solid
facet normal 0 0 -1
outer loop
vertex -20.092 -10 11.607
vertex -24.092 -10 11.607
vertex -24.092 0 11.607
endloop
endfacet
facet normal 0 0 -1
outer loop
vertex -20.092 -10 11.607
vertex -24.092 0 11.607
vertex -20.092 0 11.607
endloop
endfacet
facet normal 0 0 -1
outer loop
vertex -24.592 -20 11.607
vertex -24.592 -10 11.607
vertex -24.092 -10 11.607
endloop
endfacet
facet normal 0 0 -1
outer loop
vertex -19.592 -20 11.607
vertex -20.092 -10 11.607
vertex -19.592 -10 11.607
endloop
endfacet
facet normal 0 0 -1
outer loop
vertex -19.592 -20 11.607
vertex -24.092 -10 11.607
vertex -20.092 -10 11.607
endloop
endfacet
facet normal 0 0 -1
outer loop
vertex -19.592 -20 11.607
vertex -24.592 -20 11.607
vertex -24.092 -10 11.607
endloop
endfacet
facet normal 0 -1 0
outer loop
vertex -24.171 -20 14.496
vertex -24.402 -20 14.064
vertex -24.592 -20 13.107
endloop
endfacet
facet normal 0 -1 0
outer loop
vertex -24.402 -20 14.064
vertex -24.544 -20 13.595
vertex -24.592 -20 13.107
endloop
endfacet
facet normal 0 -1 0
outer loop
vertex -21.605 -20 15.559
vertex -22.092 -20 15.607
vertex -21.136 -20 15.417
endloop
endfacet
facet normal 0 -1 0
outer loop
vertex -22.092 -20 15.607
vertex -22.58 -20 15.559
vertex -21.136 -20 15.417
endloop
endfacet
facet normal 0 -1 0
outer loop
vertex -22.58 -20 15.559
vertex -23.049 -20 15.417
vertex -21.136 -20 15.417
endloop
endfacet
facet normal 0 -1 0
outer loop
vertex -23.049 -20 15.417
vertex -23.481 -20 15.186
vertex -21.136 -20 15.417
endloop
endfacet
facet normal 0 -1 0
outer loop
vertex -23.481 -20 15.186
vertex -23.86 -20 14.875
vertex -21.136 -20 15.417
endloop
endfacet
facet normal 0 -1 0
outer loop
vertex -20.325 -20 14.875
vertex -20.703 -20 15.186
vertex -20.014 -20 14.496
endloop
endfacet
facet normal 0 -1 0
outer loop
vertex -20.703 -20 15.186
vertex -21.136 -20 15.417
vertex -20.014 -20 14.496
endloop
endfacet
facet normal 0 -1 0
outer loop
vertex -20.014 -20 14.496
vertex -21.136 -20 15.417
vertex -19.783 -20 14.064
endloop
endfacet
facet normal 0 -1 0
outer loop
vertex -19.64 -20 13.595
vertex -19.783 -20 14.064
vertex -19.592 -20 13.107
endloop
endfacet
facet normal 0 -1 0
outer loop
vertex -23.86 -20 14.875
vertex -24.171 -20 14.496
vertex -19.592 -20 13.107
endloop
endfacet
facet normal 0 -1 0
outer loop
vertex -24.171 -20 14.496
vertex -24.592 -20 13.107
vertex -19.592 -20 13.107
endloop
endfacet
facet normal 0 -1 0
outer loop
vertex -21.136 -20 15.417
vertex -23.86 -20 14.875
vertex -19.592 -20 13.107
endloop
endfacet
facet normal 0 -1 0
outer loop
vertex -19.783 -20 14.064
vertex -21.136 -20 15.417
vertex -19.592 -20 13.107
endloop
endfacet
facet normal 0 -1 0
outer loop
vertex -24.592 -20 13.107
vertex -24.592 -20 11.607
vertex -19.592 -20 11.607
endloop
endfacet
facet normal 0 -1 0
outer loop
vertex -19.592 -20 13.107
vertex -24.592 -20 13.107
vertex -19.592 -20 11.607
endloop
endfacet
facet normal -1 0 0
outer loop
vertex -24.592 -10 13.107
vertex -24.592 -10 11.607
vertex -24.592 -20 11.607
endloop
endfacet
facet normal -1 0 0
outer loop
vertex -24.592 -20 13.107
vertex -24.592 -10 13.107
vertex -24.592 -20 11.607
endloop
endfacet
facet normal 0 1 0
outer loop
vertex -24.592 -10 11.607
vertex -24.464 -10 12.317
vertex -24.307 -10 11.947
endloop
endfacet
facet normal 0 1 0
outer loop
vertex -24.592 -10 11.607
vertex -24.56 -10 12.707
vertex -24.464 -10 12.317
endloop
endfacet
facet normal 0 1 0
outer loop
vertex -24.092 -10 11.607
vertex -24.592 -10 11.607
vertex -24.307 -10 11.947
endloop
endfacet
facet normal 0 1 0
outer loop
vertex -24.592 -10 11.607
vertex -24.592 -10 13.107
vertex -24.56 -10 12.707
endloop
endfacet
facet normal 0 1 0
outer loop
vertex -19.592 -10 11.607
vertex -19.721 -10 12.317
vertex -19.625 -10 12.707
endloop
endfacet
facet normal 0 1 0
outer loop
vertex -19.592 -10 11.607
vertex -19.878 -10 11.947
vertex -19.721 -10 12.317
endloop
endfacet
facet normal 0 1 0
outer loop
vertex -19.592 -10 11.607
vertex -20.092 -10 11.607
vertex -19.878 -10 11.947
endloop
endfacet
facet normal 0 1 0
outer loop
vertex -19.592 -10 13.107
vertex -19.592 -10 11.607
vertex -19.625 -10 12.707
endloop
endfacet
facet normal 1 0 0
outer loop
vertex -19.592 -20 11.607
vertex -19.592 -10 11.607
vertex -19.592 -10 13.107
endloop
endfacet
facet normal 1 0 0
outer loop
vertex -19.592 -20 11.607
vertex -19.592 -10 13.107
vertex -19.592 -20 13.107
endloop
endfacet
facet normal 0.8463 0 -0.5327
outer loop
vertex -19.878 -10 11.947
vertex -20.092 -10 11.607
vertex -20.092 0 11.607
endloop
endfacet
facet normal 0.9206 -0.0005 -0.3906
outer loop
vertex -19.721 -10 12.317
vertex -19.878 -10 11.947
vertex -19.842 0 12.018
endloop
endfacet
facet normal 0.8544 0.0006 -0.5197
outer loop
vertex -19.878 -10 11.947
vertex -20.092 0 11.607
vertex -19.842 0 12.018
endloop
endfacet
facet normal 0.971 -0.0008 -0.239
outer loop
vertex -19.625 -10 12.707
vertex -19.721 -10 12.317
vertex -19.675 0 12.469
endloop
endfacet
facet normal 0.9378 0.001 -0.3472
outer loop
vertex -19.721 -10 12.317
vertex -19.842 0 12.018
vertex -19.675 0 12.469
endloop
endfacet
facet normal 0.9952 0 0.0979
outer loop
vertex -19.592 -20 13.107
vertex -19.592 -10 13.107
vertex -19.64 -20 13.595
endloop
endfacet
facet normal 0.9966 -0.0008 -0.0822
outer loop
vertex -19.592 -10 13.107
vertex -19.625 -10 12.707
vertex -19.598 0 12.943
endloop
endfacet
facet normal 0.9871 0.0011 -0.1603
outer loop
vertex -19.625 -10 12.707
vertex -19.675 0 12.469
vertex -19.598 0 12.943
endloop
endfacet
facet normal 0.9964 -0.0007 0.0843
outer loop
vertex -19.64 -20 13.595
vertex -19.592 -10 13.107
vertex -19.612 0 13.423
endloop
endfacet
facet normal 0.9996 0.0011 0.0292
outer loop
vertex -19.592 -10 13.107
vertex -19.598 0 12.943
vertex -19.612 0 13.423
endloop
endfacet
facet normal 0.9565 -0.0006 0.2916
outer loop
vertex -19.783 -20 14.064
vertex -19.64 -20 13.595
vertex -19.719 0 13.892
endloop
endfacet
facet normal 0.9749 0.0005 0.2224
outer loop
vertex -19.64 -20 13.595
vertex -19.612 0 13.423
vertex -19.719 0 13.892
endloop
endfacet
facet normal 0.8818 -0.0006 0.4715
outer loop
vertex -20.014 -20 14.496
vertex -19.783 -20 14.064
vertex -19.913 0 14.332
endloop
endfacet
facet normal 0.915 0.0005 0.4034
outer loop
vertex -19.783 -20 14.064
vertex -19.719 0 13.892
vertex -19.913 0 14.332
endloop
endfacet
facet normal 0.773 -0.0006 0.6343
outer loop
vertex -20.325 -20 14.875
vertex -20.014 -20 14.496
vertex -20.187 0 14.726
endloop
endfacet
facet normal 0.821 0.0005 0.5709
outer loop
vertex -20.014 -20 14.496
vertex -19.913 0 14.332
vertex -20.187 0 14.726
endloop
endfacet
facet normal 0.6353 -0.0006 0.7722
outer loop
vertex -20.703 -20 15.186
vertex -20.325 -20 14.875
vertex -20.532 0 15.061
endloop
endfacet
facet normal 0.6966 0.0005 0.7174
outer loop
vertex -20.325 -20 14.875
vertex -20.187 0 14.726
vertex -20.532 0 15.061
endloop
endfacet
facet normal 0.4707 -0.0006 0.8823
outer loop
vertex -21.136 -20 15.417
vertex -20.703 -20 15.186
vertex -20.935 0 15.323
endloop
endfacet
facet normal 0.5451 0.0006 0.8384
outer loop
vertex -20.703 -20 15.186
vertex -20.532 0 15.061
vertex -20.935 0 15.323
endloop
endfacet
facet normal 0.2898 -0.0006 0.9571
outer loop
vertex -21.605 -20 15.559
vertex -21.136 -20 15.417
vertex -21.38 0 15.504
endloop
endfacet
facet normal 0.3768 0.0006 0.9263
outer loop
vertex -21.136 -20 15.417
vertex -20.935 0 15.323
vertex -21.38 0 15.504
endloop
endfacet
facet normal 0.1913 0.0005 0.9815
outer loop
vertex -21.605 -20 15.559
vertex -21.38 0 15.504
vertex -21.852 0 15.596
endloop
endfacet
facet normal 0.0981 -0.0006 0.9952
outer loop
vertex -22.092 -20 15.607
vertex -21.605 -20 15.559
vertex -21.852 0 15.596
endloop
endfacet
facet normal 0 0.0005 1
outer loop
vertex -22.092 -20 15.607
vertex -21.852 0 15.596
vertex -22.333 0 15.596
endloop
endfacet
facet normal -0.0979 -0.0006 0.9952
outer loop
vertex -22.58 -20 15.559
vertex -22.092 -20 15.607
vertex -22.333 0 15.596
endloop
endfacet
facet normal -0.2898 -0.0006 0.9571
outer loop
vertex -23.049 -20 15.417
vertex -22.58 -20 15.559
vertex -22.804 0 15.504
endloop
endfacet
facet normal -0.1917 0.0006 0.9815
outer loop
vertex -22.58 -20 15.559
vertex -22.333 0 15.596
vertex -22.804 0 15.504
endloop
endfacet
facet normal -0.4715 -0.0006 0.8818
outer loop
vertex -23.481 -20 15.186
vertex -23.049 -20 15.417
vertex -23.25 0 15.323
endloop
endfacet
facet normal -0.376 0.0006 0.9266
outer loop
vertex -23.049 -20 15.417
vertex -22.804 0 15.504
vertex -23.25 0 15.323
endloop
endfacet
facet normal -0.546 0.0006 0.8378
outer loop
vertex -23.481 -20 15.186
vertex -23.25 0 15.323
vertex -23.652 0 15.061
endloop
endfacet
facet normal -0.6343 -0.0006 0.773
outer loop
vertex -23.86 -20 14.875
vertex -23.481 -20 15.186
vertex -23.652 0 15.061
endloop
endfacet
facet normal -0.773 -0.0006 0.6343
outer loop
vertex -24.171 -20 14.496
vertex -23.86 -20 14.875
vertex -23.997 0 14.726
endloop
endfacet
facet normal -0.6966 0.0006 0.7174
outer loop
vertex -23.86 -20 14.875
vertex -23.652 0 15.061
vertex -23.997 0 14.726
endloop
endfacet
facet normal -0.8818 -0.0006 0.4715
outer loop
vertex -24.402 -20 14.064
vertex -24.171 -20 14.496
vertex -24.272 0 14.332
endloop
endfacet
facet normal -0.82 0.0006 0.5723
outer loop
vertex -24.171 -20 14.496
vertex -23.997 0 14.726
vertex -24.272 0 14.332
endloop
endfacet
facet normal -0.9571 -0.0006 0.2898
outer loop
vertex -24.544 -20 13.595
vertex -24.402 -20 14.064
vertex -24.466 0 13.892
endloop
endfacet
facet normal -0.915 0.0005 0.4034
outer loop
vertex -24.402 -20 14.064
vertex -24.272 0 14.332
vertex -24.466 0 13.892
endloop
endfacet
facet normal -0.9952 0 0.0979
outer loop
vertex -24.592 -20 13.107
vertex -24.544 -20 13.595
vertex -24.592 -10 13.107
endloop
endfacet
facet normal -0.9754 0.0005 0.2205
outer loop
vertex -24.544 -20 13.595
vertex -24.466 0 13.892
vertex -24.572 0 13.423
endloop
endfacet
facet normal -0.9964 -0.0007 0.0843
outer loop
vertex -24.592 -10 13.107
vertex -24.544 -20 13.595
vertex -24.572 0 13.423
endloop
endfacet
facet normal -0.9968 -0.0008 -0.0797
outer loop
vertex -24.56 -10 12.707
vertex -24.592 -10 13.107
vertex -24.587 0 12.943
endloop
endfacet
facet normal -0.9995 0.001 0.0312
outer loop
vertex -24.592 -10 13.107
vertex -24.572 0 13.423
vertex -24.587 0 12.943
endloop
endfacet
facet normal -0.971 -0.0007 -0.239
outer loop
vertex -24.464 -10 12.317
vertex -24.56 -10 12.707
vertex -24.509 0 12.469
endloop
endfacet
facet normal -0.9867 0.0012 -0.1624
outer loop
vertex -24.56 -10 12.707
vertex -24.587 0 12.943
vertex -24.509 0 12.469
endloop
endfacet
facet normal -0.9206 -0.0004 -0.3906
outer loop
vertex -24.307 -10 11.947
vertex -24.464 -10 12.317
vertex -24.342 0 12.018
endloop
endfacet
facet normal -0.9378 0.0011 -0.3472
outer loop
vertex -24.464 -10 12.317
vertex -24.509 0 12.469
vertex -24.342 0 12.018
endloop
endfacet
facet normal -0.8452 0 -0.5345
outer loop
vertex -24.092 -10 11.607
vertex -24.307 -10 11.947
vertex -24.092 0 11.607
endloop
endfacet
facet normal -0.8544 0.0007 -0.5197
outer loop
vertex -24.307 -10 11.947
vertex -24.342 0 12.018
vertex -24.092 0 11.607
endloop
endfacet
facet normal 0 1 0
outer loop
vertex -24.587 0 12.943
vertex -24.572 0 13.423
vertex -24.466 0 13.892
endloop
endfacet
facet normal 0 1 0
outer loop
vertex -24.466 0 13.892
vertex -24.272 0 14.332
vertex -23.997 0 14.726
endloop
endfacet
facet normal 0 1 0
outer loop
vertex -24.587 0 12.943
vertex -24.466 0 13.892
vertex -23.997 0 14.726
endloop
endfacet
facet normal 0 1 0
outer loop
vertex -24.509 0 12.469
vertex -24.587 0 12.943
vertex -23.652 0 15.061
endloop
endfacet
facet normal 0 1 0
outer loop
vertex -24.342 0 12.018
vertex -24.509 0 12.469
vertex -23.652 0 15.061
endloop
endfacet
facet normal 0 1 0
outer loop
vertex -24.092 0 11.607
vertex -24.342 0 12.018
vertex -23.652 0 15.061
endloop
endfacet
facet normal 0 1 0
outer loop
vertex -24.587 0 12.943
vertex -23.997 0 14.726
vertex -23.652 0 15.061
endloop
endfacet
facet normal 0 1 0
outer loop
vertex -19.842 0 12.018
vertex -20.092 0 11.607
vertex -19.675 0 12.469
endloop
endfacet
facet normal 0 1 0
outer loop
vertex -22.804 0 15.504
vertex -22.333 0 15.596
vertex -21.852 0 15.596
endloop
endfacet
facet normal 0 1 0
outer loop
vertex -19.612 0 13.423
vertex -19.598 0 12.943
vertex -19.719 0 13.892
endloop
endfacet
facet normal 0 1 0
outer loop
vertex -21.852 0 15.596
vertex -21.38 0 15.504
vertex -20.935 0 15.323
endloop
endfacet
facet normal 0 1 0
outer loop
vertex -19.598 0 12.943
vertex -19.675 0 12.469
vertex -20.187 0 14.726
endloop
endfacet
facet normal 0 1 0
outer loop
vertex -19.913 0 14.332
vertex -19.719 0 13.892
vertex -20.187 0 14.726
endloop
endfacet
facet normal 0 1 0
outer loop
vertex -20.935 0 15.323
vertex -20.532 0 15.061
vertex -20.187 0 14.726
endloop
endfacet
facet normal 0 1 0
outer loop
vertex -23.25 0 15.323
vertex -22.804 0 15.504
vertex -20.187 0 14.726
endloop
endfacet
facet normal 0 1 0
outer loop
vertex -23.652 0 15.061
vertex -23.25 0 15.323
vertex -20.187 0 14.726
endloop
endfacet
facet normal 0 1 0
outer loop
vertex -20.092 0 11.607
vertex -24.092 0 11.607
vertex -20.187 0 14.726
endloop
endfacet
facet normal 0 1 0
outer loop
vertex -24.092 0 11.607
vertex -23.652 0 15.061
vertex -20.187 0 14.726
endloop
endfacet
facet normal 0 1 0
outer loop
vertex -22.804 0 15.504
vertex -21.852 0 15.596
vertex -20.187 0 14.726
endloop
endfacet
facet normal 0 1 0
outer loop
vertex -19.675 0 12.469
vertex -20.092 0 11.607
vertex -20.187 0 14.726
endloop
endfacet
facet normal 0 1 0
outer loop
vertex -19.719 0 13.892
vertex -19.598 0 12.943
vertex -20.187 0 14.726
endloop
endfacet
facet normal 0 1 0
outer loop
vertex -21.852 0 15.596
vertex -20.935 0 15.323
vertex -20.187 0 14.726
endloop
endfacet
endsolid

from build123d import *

# Parameters (mm, degrees)
F0_R     = 2.5
F1_DEPTH = 10
F3_DEPTH = 10
F4_DEPTH = 10
F5_W     = 0.5
F5_H     = 10
F6_DEPTH = 1.5


with BuildPart() as f1:
    # F0 (on Front) → F1 (new body)
    with BuildSketch(Plane.XZ):
        with Locations((-22.092283, 13.107383)):
            Circle(F0_R)
    extrude(amount=F1_DEPTH)

    # F2 (on face) → F3 (cut)
    with BuildSketch(Plane.XZ.offset(10)):
        with BuildLine():
            Line((-20.092283, 11.607383), (-24.092283, 11.607383))
            ThreePointArc((-24.092283, 11.607383), (-22.092283, 10.607383), (-20.092283, 11.607383))
        make_face()
    extrude(amount=-F3_DEPTH, mode=Mode.SUBTRACT)

    # F1_face (on face) → F4 (join)
    with BuildSketch(Plane(origin=(-22.092283, -10, 13.107383), x_dir=(1, 0, 0), z_dir=(0, -1, 0))):
        with BuildLine():
            Line((-2, -1.5), (2, -1.5))
            ThreePointArc((2, -1.5), (0, 2.5), (-2, -1.5))
        make_face()
    extrude(amount=F4_DEPTH)

    # F5 (on face) → F6 (join)
    with BuildSketch(Plane(origin=(0, 0, 11.607383), x_dir=(1, 0, 0), z_dir=(0, 0, -1))):
        with Locations((-24.342283, 15)):
            Rectangle(F5_W, F5_H)
        with Locations((-19.842283, 15)):
            Rectangle(F5_W, F5_H)
    extrude(amount=-F6_DEPTH)


solid = f1.part
